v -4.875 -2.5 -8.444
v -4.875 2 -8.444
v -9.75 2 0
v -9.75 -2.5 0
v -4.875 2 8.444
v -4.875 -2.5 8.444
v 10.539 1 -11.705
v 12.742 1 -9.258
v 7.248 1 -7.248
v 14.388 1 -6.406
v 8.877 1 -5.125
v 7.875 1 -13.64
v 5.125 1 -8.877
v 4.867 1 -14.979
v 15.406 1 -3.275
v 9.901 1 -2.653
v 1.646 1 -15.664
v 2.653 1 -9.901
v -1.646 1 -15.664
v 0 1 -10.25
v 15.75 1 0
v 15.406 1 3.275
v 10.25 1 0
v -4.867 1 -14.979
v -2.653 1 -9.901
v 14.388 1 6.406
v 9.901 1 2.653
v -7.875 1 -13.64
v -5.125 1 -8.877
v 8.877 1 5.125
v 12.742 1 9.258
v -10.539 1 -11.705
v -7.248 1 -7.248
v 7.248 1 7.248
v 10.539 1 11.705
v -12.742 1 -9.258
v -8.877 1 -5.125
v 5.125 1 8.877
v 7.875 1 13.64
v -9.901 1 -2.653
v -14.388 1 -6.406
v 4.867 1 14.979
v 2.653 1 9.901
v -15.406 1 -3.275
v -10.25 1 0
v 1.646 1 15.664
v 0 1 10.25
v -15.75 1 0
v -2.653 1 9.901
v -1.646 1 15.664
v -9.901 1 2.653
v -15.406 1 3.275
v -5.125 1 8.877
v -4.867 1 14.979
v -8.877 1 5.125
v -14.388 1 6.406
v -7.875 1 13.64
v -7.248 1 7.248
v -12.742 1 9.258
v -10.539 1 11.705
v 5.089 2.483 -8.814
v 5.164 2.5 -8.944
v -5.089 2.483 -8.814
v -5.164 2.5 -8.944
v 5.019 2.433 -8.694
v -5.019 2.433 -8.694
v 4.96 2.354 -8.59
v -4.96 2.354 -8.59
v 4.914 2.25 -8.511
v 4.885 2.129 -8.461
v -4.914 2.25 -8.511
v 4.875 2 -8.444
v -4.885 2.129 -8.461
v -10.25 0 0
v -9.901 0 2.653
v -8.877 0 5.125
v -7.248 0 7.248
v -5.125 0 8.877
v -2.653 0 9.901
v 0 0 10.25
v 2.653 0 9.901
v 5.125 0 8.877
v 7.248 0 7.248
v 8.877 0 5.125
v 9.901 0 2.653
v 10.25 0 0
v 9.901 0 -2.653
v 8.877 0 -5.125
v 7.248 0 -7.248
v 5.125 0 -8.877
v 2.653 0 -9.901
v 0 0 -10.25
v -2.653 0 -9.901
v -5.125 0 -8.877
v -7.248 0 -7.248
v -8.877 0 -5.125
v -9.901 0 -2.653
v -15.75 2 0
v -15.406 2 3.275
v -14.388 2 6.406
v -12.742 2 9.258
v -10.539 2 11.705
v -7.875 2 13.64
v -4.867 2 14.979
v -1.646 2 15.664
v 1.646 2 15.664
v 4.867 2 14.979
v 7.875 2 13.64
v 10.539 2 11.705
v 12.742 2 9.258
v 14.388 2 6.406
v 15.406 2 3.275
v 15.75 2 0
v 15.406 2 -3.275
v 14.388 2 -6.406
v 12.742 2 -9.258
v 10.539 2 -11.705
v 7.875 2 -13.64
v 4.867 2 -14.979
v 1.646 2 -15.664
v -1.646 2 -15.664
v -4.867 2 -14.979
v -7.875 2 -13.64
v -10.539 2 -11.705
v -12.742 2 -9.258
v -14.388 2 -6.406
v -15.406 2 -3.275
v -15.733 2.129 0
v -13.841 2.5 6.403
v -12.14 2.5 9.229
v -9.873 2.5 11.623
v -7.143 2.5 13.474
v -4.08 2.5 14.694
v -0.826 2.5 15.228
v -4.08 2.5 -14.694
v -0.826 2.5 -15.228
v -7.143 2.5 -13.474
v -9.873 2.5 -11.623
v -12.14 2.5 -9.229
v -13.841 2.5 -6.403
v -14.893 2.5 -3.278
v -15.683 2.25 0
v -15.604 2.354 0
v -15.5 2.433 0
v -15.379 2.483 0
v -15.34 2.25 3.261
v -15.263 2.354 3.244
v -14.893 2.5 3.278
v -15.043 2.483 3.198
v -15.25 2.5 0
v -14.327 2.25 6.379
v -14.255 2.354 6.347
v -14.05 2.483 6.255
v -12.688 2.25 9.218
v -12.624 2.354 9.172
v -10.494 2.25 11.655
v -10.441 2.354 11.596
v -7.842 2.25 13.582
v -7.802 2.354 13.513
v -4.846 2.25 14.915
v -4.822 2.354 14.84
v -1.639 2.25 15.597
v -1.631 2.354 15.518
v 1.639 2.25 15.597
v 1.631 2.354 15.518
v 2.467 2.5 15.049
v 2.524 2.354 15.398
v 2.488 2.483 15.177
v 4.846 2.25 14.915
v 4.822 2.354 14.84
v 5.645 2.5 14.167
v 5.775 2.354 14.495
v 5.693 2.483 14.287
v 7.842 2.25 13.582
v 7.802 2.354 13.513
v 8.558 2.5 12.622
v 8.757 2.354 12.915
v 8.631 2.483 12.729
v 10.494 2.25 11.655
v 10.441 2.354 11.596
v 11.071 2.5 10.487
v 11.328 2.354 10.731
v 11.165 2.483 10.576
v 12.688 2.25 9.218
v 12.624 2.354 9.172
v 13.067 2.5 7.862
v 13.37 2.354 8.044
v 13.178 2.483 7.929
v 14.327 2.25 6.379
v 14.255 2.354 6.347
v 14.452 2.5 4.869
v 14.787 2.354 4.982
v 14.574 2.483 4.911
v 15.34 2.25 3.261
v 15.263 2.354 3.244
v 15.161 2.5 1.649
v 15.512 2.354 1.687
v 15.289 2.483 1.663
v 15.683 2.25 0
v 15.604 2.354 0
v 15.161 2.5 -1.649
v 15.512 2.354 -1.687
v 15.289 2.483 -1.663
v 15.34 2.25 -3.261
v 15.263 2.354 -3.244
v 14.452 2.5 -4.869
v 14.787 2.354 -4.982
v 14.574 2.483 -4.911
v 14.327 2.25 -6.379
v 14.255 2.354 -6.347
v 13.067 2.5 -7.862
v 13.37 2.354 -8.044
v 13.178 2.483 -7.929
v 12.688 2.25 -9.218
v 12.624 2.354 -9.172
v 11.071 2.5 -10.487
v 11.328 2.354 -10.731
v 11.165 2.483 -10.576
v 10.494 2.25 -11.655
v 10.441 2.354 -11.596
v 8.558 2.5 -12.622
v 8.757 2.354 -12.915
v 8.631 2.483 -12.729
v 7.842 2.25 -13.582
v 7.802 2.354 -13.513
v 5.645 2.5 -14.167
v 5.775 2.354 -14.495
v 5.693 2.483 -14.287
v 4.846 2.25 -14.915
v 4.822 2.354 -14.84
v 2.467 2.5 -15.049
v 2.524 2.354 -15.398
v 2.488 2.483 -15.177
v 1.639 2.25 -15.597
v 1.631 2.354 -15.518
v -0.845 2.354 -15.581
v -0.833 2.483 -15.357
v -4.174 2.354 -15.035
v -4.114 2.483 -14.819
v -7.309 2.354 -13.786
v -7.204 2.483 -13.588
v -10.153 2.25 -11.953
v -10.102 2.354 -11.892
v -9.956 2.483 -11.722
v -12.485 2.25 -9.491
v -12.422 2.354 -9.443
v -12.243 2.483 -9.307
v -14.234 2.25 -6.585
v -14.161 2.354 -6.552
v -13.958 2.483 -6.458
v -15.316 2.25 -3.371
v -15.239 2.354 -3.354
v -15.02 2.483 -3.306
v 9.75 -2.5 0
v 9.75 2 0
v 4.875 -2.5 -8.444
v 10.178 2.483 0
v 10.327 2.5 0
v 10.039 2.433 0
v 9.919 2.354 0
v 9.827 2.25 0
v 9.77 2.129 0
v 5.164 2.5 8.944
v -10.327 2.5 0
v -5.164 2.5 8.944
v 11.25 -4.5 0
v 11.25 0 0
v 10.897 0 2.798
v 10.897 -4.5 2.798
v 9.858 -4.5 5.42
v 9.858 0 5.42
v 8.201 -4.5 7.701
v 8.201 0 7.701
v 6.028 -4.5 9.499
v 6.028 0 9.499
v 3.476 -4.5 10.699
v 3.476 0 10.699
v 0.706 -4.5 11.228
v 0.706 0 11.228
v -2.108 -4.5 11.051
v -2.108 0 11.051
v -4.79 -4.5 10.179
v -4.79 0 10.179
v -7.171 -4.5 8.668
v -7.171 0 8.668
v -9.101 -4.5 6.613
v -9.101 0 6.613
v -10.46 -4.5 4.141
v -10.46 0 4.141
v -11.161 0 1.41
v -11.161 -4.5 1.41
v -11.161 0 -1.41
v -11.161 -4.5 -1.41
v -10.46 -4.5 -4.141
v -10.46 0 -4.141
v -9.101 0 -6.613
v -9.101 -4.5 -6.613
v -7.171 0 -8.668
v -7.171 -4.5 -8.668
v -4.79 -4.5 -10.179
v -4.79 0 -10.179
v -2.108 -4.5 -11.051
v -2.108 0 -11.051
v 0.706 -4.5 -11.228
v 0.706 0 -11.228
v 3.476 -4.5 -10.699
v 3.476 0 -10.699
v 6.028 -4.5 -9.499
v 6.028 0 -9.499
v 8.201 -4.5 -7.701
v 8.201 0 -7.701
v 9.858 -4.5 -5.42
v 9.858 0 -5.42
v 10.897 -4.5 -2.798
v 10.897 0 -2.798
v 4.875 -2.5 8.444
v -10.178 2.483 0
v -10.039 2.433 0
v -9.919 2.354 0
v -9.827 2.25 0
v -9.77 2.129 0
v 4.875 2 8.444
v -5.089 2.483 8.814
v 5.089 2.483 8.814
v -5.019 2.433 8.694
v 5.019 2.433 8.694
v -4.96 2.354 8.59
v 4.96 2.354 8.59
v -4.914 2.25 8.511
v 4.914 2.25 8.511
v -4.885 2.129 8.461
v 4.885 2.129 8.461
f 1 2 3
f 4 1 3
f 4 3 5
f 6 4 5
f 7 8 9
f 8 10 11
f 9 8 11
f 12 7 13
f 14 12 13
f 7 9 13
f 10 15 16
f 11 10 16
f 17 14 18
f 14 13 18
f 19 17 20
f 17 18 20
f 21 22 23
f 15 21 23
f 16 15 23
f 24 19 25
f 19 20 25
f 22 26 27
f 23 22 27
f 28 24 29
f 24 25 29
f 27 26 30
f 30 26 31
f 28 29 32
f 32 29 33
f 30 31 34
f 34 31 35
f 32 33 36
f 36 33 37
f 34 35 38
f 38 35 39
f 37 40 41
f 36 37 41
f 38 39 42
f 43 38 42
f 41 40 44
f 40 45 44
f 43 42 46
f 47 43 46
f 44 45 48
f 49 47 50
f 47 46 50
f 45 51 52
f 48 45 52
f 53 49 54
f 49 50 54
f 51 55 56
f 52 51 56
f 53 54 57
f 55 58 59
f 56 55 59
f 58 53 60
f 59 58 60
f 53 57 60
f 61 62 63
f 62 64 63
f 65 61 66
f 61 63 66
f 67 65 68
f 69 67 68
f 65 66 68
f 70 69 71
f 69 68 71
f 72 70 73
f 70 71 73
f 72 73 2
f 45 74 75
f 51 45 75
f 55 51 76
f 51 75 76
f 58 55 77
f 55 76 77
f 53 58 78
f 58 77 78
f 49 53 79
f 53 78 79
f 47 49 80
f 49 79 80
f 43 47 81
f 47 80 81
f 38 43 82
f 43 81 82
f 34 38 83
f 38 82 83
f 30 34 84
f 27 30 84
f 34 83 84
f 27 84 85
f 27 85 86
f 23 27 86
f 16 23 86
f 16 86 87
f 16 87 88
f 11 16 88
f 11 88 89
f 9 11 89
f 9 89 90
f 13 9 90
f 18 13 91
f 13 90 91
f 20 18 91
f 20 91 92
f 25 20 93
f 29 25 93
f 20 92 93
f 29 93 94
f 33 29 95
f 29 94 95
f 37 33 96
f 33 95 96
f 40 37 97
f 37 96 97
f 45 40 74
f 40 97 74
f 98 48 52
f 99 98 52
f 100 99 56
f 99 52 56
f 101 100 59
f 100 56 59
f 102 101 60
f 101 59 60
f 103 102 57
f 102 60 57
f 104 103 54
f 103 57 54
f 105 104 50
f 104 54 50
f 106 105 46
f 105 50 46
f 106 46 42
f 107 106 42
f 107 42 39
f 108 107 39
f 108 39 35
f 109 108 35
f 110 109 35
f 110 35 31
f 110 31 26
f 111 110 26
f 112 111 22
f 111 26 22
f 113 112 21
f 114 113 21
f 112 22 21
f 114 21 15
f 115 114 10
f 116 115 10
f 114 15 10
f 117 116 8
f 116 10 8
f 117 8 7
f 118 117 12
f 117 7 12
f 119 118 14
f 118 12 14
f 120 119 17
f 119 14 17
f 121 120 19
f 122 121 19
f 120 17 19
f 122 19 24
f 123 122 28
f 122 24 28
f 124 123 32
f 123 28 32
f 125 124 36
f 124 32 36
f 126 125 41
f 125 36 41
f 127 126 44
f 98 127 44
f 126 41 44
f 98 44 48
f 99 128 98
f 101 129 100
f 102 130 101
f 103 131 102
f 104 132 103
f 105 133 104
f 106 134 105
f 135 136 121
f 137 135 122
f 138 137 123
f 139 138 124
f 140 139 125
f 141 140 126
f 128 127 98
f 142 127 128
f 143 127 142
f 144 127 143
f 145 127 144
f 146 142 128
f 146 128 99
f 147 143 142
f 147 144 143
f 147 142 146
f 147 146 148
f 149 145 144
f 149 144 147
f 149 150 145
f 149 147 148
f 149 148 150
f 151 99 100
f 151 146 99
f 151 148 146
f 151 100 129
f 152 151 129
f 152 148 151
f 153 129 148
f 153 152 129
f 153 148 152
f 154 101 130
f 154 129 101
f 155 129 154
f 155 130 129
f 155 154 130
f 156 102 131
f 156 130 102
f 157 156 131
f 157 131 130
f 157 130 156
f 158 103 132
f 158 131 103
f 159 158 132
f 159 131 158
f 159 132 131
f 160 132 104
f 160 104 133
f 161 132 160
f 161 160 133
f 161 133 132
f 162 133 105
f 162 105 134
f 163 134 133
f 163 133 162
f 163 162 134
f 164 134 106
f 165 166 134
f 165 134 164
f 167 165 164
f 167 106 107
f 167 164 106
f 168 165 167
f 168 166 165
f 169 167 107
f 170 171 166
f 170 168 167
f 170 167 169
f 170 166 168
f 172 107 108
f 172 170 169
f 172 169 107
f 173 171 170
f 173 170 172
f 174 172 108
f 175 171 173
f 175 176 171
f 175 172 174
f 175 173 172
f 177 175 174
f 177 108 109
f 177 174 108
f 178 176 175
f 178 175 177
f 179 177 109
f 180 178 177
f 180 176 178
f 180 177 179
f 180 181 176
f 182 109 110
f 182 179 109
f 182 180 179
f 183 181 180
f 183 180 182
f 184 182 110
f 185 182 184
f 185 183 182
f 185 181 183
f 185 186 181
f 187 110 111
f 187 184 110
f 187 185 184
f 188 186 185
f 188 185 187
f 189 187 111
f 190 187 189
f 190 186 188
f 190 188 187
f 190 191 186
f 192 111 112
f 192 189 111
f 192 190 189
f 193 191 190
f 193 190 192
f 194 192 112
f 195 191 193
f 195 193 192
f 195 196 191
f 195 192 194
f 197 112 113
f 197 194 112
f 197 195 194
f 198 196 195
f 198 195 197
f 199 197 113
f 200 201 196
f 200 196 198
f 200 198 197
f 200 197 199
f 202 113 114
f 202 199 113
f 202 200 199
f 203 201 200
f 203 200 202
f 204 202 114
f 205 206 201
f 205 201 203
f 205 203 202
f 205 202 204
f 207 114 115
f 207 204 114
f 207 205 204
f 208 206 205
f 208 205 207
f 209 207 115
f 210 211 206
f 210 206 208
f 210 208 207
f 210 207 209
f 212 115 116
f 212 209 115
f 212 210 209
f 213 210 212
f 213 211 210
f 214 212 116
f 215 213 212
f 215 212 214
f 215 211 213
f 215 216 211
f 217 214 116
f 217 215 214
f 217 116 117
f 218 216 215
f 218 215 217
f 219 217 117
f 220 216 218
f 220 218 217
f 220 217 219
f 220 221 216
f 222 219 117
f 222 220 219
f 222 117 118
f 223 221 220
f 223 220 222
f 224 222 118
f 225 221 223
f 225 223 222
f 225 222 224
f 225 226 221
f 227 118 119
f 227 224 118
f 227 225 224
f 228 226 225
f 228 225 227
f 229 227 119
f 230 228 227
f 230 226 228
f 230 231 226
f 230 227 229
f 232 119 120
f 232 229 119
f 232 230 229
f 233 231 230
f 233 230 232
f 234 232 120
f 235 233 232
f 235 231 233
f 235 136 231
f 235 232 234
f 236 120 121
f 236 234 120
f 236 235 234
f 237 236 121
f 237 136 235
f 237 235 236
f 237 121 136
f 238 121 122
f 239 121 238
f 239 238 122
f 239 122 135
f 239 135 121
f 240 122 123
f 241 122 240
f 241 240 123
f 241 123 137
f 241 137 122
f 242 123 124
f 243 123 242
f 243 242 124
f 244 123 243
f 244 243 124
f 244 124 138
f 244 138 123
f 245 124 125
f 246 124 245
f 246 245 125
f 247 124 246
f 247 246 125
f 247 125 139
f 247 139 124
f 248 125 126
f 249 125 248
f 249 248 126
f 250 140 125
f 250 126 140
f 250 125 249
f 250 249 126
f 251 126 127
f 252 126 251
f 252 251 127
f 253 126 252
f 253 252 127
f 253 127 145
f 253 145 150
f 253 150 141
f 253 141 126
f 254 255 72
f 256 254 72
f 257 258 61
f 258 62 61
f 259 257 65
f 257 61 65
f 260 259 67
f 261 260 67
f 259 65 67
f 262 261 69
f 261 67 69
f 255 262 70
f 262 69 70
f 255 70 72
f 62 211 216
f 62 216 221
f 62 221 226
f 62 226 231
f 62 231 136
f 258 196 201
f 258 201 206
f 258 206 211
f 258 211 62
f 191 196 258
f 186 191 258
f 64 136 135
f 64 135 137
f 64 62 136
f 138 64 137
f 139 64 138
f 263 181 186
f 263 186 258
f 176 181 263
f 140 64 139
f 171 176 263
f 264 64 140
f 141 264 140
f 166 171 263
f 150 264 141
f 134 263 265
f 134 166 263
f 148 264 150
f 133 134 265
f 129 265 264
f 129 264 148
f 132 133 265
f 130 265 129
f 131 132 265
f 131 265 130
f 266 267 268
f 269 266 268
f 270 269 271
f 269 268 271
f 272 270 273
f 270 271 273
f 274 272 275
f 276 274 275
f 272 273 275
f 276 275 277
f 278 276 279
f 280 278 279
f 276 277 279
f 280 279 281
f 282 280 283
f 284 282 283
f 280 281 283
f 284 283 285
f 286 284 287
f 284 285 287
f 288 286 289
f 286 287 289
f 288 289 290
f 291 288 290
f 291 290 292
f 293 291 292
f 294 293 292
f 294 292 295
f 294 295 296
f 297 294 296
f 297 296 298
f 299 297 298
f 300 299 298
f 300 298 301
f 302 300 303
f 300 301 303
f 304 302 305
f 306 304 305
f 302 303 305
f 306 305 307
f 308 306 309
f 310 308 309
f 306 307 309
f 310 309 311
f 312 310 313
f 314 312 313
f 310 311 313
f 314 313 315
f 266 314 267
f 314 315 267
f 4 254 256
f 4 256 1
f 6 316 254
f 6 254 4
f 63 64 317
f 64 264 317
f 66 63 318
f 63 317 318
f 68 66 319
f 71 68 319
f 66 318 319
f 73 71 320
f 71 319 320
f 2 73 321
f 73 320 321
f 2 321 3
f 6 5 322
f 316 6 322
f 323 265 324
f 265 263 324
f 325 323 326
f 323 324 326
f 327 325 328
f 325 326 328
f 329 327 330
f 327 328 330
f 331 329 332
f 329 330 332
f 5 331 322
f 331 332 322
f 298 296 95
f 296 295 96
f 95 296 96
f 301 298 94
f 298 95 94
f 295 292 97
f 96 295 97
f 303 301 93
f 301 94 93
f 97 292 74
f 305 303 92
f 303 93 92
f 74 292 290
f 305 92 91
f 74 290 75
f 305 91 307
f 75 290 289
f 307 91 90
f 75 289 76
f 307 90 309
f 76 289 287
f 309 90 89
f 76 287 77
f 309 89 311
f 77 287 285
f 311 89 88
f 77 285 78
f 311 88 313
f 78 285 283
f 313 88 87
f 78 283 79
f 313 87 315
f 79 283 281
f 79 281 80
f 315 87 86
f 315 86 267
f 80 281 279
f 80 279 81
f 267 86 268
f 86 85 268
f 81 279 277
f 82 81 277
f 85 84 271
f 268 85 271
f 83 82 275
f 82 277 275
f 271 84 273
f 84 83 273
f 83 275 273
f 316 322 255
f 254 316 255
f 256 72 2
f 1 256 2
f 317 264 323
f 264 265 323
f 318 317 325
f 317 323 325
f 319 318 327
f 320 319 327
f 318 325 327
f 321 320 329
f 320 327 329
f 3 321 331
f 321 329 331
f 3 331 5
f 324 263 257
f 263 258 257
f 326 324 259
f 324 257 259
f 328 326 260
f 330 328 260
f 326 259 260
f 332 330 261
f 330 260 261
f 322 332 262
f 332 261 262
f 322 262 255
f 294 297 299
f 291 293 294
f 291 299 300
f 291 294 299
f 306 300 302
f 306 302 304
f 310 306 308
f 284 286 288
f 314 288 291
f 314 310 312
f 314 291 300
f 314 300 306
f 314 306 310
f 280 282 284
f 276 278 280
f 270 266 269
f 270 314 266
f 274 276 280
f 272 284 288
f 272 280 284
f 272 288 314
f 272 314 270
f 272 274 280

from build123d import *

# Parameters (mm, degrees)
F0_R     = 11.25
F1_DEPTH = 4.5
F2_R     = 10.25
F3_DEPTH = 1
F4_R     = 15.75
F5_DEPTH = 1.5
F7_DEPTH = 5
F8_R     = 0.5


with BuildPart() as f1:
    # F0 (on Front) → F1 (new body)
    with BuildSketch(Plane.XZ):
        Circle(F0_R)
    extrude(amount=F1_DEPTH)

    # F2 (on face) → F3 (join)
    with BuildSketch(Plane(origin=(0, 0, 0), x_dir=(-1, 0, 0), z_dir=(0, 1, 0))):
        Circle(F2_R)
    extrude(amount=F3_DEPTH)

    # F4 (on face) → F5 (join)
    with BuildSketch(Plane(origin=(0, 1, 0), x_dir=(-1, 0, 0), z_dir=(0, 1, 0))):
        Circle(F4_R)
    extrude(amount=F5_DEPTH)

    # F6 (on face) → F7 (cut)
    with BuildSketch(Plane(origin=(0, 2.5, 0), x_dir=(-1, 0, 0), z_dir=(0, 1, 0))):
        Polygon((4.875, 8.4437476869), (-4.875, 8.4437476869), (-9.75, 0), (-4.875, -8.4437476869), (4.875, -8.4437476869), (9.75, 0), align=None)
    extrude(amount=-F7_DEPTH, mode=Mode.SUBTRACT)

    # F8
    f8_edges = [f1.edges().sort_by_distance(p)[0] for p in [
        (15.75, 2.5, 0),
        (0, 2.5, 8.443748),
        (7.3125, 2.5, 4.221874),
        (7.3125, 2.5, -4.221874),
        (0, 2.5, -8.443748),
        (-7.3125, 2.5, -4.221874),
        (-7.3125, 2.5, 4.221874),
    ]]
    fillet(f8_edges, radius=F8_R)


solid = f1.part
